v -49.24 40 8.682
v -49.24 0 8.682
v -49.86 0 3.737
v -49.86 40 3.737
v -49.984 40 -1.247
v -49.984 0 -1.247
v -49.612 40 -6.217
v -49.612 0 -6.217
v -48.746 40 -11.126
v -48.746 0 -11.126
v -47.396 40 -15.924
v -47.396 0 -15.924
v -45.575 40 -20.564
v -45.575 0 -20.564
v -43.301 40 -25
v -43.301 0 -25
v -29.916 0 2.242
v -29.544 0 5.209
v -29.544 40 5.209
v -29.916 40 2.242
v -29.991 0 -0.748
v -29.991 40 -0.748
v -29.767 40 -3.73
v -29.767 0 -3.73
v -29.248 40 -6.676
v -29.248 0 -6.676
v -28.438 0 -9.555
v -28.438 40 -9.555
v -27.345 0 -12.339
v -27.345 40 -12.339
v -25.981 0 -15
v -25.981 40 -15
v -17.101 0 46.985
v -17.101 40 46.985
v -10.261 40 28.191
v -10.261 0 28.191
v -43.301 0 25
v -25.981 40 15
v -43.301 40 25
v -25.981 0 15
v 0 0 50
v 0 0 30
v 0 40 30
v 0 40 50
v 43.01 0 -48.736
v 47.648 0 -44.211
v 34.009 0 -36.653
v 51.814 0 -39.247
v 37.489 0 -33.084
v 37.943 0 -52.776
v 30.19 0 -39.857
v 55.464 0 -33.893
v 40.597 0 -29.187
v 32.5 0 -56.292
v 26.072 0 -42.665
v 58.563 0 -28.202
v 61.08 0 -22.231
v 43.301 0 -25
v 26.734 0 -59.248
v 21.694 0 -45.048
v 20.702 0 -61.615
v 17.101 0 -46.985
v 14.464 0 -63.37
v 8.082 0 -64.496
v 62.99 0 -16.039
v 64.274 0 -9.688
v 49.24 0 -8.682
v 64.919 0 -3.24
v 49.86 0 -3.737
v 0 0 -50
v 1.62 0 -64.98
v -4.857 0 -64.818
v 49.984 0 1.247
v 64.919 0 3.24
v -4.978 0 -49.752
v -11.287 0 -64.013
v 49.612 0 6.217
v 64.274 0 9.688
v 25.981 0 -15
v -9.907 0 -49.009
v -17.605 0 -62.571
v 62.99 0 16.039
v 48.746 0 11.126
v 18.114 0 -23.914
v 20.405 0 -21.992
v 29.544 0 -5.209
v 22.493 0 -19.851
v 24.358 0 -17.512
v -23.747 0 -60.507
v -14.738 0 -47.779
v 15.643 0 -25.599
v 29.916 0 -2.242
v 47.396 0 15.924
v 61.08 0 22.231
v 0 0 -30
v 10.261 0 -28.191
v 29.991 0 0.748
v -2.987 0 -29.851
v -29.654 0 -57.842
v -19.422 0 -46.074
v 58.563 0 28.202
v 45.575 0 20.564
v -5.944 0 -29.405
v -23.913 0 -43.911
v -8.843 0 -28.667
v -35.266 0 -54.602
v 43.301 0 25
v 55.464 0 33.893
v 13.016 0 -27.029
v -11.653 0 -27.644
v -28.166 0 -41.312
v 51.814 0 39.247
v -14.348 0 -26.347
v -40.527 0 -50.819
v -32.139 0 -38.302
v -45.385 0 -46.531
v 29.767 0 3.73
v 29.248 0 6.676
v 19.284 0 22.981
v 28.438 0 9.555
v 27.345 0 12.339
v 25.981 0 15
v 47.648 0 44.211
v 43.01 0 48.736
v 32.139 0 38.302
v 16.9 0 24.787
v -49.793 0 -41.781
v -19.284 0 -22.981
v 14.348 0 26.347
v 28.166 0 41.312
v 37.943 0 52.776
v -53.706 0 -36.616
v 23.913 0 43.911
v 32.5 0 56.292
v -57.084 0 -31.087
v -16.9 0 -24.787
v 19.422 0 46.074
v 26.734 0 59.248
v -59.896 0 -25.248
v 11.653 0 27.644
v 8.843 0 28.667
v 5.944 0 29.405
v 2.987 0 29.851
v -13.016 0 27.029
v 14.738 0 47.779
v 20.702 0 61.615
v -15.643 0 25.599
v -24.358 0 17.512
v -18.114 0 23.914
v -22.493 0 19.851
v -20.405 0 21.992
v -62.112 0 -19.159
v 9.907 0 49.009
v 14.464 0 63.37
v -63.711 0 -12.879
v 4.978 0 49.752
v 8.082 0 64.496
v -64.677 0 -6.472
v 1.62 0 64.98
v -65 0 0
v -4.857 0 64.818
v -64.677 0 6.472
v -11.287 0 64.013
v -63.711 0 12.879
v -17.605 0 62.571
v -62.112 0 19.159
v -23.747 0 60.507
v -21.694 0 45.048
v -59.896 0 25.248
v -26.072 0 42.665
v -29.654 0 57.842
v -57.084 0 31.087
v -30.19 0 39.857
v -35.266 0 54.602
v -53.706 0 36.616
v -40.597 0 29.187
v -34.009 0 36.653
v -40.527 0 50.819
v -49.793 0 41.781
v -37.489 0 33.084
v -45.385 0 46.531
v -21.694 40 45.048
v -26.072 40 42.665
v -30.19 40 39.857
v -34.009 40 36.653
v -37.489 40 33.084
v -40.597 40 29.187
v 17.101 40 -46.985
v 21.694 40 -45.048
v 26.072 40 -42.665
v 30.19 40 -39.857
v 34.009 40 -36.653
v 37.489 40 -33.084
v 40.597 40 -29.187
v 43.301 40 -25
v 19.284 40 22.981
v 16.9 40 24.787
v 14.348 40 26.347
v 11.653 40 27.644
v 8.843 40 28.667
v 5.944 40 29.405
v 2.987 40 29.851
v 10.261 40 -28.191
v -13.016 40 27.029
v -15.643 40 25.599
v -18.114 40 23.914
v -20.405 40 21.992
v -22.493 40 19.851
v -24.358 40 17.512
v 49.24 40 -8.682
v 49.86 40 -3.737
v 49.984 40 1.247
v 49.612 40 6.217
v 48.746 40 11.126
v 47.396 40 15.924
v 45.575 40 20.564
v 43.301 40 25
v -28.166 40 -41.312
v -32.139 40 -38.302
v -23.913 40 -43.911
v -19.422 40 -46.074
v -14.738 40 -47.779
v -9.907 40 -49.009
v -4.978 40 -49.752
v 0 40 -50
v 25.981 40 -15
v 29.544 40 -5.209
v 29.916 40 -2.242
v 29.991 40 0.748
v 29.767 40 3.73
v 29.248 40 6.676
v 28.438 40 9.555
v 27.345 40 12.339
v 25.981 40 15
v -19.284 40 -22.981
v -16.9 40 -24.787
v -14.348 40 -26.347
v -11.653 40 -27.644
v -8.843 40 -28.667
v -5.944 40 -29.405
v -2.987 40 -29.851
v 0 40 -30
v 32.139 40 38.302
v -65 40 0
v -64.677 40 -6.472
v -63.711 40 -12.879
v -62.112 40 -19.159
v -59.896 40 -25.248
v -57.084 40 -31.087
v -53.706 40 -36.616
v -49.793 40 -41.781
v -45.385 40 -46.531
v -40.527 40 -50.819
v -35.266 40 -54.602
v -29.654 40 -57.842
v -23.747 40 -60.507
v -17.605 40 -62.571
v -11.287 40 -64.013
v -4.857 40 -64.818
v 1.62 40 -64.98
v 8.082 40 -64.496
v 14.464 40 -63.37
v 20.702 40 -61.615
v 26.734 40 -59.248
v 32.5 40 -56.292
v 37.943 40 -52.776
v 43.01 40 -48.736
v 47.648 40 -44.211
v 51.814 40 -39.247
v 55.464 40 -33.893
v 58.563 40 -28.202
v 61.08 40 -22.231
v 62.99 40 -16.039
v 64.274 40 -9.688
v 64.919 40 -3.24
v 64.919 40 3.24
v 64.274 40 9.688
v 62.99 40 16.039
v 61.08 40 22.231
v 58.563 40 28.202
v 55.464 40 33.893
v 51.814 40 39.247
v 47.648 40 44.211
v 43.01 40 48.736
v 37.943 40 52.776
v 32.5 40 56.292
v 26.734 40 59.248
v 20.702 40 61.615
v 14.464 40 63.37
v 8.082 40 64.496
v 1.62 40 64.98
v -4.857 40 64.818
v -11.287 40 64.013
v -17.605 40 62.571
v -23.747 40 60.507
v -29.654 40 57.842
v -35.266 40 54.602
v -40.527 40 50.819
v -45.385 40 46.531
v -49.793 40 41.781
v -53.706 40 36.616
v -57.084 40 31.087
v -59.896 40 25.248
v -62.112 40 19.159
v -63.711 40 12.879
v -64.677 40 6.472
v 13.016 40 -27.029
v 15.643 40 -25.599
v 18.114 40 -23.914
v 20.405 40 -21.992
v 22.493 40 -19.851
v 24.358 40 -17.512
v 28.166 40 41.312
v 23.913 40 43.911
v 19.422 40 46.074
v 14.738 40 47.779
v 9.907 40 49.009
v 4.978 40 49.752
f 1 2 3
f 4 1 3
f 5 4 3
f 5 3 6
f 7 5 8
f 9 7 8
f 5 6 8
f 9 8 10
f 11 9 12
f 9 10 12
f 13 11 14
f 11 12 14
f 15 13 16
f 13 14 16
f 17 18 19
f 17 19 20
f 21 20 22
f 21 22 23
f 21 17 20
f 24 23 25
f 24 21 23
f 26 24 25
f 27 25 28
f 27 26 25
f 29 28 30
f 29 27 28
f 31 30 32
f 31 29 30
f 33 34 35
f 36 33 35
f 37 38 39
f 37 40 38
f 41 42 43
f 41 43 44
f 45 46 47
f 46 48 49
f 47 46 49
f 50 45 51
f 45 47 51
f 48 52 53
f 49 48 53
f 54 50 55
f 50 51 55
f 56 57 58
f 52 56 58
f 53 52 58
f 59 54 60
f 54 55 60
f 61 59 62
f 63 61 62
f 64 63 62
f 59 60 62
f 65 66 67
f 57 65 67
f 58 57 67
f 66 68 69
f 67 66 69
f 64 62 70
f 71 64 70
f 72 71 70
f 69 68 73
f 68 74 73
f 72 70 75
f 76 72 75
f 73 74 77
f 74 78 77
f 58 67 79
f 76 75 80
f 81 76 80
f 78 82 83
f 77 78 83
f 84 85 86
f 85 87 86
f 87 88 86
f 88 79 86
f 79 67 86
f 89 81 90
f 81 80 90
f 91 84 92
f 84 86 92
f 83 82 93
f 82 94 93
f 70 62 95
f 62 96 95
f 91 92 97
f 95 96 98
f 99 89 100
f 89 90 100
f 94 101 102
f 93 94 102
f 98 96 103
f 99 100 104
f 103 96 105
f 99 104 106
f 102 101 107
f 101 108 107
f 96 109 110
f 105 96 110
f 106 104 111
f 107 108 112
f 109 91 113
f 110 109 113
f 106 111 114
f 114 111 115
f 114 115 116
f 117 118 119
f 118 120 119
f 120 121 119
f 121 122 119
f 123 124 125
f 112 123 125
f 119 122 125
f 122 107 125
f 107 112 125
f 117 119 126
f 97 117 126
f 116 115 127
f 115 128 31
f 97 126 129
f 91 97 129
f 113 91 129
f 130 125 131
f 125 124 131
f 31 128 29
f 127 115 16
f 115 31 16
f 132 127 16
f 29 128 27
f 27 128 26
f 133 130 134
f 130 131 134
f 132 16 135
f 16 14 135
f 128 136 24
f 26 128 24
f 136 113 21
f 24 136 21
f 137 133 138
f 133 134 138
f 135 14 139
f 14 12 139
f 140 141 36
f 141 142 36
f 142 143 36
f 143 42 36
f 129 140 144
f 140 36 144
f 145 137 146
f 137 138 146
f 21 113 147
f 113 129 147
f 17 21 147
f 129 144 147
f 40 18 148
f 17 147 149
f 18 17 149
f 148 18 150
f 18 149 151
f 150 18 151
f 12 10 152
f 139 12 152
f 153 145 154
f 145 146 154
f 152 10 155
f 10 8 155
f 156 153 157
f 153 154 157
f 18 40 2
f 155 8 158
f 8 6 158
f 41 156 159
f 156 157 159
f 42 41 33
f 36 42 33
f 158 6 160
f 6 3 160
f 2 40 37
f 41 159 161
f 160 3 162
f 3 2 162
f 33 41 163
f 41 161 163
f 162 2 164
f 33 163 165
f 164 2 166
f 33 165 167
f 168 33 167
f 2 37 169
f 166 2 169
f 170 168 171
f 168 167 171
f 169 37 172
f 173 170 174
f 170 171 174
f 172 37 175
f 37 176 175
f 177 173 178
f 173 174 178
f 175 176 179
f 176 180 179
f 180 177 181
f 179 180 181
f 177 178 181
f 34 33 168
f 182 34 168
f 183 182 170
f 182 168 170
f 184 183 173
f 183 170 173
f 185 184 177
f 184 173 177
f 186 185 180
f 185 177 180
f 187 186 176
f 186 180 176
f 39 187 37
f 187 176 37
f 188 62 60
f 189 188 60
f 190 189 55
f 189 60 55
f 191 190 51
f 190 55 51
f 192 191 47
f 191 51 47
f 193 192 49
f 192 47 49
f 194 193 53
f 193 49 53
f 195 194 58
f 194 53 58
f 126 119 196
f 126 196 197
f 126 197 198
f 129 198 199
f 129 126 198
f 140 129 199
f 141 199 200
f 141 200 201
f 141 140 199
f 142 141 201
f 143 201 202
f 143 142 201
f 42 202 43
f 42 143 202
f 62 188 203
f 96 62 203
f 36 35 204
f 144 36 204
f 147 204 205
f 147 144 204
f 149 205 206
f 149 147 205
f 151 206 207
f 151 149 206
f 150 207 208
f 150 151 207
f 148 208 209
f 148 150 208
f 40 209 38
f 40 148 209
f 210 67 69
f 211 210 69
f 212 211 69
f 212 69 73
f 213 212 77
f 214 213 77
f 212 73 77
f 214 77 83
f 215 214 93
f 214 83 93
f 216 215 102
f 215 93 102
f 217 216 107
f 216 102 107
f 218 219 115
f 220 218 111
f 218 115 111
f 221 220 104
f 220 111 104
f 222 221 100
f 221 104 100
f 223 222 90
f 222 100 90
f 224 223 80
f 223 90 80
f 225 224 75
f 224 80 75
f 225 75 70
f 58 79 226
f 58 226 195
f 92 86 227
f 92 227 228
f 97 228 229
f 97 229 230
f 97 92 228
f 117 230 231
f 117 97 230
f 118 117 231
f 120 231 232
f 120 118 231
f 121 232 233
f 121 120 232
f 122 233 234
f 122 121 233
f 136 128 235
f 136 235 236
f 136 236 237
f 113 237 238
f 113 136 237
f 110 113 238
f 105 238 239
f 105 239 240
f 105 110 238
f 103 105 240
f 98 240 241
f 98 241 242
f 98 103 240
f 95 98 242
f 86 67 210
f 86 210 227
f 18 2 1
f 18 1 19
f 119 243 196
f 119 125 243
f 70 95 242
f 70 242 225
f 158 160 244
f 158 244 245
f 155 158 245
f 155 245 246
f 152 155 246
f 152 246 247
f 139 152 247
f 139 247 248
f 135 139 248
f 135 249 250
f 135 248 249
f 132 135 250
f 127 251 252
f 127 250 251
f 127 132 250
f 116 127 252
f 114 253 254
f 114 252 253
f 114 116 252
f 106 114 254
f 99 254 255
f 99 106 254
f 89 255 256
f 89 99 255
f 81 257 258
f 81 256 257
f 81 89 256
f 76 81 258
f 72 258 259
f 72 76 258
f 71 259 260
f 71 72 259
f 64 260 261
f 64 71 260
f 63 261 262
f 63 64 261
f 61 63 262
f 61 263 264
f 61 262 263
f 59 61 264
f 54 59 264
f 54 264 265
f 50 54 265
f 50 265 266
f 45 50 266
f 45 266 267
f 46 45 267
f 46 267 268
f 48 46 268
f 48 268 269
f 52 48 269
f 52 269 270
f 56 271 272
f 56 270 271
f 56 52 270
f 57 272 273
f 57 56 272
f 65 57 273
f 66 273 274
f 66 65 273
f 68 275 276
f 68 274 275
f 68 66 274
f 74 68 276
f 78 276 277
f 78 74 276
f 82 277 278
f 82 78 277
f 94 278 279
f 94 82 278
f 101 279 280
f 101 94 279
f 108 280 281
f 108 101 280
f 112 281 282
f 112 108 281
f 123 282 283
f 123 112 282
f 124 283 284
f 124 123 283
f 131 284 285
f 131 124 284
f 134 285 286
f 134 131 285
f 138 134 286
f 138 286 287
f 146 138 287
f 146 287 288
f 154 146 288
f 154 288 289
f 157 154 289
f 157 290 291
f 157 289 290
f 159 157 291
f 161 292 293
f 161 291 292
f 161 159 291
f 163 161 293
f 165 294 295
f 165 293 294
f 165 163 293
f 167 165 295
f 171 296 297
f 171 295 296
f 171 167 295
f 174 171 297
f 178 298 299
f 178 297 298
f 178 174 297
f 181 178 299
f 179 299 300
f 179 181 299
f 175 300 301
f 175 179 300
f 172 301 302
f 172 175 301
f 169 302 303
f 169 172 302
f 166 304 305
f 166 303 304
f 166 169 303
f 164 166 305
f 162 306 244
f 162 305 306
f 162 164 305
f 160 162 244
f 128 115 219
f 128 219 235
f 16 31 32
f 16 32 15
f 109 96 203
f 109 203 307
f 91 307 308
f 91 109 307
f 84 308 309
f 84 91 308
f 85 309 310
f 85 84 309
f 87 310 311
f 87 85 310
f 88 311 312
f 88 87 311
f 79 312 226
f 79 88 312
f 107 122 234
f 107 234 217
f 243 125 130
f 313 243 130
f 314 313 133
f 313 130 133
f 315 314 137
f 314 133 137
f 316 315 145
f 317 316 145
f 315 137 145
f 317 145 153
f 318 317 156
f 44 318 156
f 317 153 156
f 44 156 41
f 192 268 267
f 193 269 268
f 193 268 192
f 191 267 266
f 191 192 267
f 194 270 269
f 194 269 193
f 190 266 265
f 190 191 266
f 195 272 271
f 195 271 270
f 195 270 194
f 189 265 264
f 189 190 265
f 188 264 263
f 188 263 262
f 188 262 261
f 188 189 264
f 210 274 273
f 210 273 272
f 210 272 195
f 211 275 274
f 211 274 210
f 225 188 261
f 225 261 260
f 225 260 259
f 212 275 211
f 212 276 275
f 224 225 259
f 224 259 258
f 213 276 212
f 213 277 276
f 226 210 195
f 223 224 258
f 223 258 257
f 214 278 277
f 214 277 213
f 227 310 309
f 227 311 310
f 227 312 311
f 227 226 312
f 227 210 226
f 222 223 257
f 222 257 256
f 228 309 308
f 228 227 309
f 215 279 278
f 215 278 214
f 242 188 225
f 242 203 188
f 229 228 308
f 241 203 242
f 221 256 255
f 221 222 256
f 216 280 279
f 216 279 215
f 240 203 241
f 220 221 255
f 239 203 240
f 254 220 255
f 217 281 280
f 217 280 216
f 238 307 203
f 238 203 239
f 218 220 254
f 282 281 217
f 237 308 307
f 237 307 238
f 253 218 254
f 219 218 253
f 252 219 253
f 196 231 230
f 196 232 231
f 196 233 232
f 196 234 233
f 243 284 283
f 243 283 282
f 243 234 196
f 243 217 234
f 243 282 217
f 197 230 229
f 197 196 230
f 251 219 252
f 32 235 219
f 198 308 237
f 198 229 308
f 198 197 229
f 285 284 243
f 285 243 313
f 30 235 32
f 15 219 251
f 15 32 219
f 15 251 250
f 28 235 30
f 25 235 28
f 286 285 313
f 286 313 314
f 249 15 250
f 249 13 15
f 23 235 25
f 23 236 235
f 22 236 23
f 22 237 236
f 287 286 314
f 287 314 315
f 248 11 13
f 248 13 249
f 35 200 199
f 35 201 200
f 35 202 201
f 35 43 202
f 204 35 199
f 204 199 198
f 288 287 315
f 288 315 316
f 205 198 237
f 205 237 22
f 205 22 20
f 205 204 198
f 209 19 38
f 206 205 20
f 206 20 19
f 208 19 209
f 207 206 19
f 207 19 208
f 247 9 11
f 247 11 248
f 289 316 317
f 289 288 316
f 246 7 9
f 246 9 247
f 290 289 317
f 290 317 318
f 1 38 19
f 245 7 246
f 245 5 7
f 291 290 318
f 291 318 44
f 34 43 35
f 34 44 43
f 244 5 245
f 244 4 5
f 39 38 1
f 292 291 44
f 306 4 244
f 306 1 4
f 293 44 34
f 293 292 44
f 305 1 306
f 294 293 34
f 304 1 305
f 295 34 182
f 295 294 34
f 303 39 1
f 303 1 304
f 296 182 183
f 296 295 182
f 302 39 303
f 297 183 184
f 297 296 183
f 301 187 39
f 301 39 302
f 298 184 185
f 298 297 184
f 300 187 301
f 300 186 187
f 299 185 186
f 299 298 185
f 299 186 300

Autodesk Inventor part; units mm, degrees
ref_plane "YZ Plane" through (0, 0, 0) normal (1, 0, 0) x (0, 1, 0)
ref_plane "XZ Plane" through (0, 0, 0) normal (0, 1, 0) x (-1, 0, 0)
ref_plane "XY Plane" through (0, 0, 0) normal (0, 0, 1) x (1, 0, 0)
sketch "Sketch1" plane through (0, 0, 0) normal (0, 1, 0) x (-1, 0, 0)
  circle A0 centre (0, 0) radius 65
  dimension "d0" = 130
extrude "Extrusion1" add sketch "Sketch1" along normal blind 40
sketch "Sketch2" plane through (0, 0, 0) normal (0, -1, 0) x (1, 0, 0)
  line L0 (0, 0) -> (0, 50)
  arc A0 (32.1394, 38.3022) -> (0, 50) centre (0, 0) ccw
  arc A1 (19.2836, 22.9813) -> (0, 30) centre (0, 0) ccw
  line L1 (0, 0) -> (19.2836, 22.9813)
  line L2 (32.1394, 38.3022) -> (19.2836, 22.9813)
  dimension "d4" = 40
  dimension "d5" = 30
  dimension "d6" = 50
extrude "Extrusion2" cut sketch "Sketch2" against normal through all contours L0 A0 L2 A1
pattern_circular "Circular Pattern1" count 6 over 360 about axis through (0, 0, 0) along (0, 1, 0) of "Extrusion2"
properties part number "Large Flywheel"
